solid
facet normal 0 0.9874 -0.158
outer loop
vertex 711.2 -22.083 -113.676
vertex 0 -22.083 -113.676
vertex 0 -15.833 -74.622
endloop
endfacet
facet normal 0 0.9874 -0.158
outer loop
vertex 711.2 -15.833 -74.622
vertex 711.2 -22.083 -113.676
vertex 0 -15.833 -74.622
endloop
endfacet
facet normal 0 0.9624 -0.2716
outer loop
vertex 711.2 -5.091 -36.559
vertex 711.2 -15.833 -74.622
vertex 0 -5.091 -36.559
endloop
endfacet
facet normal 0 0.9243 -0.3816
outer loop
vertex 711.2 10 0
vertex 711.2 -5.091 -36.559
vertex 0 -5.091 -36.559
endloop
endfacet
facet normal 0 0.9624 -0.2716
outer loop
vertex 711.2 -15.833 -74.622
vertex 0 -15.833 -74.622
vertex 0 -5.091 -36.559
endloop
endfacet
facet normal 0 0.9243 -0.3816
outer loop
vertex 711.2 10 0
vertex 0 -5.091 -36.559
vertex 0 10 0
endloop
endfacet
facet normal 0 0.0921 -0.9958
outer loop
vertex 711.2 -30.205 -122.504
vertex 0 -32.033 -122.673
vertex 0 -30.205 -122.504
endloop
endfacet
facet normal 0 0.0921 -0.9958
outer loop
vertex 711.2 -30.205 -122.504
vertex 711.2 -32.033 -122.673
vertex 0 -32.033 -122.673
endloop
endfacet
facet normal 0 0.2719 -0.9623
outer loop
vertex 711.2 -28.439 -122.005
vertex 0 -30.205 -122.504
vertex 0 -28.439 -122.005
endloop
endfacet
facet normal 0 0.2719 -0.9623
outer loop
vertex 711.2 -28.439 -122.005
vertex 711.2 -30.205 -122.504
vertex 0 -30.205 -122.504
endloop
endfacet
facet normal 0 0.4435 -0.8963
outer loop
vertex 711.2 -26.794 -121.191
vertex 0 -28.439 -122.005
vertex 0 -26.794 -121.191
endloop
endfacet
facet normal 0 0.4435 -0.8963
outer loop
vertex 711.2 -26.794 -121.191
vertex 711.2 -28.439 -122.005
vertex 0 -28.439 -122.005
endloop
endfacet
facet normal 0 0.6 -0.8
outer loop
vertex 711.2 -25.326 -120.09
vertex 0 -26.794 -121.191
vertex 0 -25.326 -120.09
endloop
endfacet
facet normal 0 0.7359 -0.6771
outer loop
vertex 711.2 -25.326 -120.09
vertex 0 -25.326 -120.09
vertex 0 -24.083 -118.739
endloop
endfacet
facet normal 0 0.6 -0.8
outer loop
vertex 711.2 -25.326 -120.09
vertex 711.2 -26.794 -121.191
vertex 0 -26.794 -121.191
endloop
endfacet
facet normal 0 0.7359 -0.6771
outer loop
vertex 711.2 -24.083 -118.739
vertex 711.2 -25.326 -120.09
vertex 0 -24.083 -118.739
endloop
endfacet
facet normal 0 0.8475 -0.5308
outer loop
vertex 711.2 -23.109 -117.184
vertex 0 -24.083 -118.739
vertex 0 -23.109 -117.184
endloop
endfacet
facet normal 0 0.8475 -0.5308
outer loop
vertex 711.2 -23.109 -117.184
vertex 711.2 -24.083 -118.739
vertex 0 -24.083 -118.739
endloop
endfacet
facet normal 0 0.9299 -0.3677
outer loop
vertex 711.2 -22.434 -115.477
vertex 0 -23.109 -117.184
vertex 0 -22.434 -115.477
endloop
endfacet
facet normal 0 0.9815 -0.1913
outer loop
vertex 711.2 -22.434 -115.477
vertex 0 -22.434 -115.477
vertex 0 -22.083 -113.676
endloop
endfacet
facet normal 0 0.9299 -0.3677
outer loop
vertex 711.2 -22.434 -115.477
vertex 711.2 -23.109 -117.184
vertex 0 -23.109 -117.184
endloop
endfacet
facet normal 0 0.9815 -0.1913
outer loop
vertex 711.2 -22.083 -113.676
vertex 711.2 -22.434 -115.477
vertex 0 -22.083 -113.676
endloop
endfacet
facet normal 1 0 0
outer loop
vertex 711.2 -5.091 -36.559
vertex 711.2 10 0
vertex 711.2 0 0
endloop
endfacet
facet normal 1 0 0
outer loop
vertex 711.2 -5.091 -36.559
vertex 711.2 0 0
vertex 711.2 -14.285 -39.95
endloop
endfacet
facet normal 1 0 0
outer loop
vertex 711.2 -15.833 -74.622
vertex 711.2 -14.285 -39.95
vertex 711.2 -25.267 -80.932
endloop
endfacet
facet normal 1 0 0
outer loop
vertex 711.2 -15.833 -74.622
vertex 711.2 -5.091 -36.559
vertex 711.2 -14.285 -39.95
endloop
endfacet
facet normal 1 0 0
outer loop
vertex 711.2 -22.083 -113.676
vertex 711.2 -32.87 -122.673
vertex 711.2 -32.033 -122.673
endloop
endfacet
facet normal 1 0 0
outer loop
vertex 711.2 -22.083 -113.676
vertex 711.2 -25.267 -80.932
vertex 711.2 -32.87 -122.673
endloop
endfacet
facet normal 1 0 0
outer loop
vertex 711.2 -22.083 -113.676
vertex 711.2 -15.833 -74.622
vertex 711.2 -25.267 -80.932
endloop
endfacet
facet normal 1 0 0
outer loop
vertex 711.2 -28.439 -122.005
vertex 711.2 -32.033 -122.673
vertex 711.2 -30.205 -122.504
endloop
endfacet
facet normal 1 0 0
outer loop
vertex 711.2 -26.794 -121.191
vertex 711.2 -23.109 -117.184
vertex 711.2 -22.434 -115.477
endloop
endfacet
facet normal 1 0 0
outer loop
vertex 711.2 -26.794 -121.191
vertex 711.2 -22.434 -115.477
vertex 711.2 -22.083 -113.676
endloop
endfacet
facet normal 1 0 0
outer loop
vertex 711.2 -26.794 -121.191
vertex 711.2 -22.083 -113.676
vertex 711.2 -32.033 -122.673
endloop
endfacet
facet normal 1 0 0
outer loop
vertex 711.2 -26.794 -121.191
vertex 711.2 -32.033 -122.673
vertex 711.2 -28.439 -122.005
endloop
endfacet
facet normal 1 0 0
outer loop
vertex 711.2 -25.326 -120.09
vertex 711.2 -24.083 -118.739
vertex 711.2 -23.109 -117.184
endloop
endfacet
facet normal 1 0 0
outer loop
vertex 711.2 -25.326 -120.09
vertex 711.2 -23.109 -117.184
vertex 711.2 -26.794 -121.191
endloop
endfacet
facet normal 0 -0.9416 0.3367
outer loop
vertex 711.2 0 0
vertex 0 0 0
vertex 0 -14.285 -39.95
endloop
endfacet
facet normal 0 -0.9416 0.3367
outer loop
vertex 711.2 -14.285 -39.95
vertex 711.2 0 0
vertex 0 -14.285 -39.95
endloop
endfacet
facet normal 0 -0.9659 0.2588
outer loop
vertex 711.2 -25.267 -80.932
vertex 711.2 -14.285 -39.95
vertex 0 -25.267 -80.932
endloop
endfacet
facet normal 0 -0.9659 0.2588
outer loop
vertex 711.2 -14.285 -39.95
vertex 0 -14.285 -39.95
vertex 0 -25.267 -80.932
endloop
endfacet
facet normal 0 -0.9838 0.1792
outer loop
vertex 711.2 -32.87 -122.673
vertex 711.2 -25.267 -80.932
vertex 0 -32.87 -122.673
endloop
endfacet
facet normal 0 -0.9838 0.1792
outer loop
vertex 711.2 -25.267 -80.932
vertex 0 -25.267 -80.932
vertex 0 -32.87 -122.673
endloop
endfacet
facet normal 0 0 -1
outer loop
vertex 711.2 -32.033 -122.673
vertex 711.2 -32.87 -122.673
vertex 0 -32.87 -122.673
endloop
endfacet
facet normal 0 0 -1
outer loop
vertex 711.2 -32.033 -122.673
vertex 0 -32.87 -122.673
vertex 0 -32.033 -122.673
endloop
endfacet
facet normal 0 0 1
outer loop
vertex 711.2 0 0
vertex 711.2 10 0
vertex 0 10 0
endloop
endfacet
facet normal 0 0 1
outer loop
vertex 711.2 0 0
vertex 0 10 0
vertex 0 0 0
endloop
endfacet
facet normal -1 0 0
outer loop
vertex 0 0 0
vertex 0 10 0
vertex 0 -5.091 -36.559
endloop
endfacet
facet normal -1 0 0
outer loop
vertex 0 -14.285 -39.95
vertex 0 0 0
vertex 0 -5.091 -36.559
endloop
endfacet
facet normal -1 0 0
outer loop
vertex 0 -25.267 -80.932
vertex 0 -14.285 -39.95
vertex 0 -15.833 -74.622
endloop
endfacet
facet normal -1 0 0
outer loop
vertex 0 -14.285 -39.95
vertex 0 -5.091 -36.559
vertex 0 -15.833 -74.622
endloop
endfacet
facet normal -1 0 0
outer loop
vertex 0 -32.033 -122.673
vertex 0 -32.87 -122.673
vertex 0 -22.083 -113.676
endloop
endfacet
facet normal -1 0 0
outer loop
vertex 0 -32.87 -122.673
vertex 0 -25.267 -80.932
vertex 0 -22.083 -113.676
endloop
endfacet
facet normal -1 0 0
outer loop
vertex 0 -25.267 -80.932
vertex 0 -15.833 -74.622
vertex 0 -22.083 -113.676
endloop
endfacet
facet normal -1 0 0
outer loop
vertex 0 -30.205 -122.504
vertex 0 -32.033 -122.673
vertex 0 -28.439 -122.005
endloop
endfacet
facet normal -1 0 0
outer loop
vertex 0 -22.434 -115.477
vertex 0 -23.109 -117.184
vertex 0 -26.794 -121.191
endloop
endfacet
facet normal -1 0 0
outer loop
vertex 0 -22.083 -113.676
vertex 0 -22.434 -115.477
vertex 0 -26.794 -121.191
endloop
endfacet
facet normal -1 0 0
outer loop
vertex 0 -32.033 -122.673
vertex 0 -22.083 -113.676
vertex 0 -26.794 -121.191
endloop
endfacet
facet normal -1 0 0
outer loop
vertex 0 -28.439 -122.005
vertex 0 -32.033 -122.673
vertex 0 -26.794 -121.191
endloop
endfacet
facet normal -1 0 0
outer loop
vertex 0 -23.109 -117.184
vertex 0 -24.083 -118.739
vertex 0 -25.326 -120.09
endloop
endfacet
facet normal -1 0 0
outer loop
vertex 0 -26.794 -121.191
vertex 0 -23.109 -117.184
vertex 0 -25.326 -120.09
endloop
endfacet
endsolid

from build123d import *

# Parameters (mm, degrees)
BOSS_EXTRUDE1_DEPTH = 711.2
FILLET1_R           = 10


with BuildPart() as part:
    # Sketch1 → Boss-Extrude1 (new body)
    with BuildSketch(Plane(origin=(0, 0, 0), x_dir=(0, 0, -1), z_dir=(1, 0, 0))):
        with BuildLine():
            Line((122.672579939, -32.870018728), (122.672579939, -22.870018728))
            ThreePointArc((122.672579939, -22.870018728), (59.787928159, -12.213574307), (0, 10))
            Line((0, 10), (0, 0))
            ThreePointArc((0, 0), (60.329037039, -20.194128476), (122.672579939, -32.870018728))
        make_face()
    extrude(amount=BOSS_EXTRUDE1_DEPTH)

    # Fillet1
    fillet1_edges = [part.edges().sort_by_distance(p)[0] for p in [
        (355.6, -22.870018728, -122.672579939),
    ]]
    fillet(fillet1_edges, radius=FILLET1_R)


solid = part.part
